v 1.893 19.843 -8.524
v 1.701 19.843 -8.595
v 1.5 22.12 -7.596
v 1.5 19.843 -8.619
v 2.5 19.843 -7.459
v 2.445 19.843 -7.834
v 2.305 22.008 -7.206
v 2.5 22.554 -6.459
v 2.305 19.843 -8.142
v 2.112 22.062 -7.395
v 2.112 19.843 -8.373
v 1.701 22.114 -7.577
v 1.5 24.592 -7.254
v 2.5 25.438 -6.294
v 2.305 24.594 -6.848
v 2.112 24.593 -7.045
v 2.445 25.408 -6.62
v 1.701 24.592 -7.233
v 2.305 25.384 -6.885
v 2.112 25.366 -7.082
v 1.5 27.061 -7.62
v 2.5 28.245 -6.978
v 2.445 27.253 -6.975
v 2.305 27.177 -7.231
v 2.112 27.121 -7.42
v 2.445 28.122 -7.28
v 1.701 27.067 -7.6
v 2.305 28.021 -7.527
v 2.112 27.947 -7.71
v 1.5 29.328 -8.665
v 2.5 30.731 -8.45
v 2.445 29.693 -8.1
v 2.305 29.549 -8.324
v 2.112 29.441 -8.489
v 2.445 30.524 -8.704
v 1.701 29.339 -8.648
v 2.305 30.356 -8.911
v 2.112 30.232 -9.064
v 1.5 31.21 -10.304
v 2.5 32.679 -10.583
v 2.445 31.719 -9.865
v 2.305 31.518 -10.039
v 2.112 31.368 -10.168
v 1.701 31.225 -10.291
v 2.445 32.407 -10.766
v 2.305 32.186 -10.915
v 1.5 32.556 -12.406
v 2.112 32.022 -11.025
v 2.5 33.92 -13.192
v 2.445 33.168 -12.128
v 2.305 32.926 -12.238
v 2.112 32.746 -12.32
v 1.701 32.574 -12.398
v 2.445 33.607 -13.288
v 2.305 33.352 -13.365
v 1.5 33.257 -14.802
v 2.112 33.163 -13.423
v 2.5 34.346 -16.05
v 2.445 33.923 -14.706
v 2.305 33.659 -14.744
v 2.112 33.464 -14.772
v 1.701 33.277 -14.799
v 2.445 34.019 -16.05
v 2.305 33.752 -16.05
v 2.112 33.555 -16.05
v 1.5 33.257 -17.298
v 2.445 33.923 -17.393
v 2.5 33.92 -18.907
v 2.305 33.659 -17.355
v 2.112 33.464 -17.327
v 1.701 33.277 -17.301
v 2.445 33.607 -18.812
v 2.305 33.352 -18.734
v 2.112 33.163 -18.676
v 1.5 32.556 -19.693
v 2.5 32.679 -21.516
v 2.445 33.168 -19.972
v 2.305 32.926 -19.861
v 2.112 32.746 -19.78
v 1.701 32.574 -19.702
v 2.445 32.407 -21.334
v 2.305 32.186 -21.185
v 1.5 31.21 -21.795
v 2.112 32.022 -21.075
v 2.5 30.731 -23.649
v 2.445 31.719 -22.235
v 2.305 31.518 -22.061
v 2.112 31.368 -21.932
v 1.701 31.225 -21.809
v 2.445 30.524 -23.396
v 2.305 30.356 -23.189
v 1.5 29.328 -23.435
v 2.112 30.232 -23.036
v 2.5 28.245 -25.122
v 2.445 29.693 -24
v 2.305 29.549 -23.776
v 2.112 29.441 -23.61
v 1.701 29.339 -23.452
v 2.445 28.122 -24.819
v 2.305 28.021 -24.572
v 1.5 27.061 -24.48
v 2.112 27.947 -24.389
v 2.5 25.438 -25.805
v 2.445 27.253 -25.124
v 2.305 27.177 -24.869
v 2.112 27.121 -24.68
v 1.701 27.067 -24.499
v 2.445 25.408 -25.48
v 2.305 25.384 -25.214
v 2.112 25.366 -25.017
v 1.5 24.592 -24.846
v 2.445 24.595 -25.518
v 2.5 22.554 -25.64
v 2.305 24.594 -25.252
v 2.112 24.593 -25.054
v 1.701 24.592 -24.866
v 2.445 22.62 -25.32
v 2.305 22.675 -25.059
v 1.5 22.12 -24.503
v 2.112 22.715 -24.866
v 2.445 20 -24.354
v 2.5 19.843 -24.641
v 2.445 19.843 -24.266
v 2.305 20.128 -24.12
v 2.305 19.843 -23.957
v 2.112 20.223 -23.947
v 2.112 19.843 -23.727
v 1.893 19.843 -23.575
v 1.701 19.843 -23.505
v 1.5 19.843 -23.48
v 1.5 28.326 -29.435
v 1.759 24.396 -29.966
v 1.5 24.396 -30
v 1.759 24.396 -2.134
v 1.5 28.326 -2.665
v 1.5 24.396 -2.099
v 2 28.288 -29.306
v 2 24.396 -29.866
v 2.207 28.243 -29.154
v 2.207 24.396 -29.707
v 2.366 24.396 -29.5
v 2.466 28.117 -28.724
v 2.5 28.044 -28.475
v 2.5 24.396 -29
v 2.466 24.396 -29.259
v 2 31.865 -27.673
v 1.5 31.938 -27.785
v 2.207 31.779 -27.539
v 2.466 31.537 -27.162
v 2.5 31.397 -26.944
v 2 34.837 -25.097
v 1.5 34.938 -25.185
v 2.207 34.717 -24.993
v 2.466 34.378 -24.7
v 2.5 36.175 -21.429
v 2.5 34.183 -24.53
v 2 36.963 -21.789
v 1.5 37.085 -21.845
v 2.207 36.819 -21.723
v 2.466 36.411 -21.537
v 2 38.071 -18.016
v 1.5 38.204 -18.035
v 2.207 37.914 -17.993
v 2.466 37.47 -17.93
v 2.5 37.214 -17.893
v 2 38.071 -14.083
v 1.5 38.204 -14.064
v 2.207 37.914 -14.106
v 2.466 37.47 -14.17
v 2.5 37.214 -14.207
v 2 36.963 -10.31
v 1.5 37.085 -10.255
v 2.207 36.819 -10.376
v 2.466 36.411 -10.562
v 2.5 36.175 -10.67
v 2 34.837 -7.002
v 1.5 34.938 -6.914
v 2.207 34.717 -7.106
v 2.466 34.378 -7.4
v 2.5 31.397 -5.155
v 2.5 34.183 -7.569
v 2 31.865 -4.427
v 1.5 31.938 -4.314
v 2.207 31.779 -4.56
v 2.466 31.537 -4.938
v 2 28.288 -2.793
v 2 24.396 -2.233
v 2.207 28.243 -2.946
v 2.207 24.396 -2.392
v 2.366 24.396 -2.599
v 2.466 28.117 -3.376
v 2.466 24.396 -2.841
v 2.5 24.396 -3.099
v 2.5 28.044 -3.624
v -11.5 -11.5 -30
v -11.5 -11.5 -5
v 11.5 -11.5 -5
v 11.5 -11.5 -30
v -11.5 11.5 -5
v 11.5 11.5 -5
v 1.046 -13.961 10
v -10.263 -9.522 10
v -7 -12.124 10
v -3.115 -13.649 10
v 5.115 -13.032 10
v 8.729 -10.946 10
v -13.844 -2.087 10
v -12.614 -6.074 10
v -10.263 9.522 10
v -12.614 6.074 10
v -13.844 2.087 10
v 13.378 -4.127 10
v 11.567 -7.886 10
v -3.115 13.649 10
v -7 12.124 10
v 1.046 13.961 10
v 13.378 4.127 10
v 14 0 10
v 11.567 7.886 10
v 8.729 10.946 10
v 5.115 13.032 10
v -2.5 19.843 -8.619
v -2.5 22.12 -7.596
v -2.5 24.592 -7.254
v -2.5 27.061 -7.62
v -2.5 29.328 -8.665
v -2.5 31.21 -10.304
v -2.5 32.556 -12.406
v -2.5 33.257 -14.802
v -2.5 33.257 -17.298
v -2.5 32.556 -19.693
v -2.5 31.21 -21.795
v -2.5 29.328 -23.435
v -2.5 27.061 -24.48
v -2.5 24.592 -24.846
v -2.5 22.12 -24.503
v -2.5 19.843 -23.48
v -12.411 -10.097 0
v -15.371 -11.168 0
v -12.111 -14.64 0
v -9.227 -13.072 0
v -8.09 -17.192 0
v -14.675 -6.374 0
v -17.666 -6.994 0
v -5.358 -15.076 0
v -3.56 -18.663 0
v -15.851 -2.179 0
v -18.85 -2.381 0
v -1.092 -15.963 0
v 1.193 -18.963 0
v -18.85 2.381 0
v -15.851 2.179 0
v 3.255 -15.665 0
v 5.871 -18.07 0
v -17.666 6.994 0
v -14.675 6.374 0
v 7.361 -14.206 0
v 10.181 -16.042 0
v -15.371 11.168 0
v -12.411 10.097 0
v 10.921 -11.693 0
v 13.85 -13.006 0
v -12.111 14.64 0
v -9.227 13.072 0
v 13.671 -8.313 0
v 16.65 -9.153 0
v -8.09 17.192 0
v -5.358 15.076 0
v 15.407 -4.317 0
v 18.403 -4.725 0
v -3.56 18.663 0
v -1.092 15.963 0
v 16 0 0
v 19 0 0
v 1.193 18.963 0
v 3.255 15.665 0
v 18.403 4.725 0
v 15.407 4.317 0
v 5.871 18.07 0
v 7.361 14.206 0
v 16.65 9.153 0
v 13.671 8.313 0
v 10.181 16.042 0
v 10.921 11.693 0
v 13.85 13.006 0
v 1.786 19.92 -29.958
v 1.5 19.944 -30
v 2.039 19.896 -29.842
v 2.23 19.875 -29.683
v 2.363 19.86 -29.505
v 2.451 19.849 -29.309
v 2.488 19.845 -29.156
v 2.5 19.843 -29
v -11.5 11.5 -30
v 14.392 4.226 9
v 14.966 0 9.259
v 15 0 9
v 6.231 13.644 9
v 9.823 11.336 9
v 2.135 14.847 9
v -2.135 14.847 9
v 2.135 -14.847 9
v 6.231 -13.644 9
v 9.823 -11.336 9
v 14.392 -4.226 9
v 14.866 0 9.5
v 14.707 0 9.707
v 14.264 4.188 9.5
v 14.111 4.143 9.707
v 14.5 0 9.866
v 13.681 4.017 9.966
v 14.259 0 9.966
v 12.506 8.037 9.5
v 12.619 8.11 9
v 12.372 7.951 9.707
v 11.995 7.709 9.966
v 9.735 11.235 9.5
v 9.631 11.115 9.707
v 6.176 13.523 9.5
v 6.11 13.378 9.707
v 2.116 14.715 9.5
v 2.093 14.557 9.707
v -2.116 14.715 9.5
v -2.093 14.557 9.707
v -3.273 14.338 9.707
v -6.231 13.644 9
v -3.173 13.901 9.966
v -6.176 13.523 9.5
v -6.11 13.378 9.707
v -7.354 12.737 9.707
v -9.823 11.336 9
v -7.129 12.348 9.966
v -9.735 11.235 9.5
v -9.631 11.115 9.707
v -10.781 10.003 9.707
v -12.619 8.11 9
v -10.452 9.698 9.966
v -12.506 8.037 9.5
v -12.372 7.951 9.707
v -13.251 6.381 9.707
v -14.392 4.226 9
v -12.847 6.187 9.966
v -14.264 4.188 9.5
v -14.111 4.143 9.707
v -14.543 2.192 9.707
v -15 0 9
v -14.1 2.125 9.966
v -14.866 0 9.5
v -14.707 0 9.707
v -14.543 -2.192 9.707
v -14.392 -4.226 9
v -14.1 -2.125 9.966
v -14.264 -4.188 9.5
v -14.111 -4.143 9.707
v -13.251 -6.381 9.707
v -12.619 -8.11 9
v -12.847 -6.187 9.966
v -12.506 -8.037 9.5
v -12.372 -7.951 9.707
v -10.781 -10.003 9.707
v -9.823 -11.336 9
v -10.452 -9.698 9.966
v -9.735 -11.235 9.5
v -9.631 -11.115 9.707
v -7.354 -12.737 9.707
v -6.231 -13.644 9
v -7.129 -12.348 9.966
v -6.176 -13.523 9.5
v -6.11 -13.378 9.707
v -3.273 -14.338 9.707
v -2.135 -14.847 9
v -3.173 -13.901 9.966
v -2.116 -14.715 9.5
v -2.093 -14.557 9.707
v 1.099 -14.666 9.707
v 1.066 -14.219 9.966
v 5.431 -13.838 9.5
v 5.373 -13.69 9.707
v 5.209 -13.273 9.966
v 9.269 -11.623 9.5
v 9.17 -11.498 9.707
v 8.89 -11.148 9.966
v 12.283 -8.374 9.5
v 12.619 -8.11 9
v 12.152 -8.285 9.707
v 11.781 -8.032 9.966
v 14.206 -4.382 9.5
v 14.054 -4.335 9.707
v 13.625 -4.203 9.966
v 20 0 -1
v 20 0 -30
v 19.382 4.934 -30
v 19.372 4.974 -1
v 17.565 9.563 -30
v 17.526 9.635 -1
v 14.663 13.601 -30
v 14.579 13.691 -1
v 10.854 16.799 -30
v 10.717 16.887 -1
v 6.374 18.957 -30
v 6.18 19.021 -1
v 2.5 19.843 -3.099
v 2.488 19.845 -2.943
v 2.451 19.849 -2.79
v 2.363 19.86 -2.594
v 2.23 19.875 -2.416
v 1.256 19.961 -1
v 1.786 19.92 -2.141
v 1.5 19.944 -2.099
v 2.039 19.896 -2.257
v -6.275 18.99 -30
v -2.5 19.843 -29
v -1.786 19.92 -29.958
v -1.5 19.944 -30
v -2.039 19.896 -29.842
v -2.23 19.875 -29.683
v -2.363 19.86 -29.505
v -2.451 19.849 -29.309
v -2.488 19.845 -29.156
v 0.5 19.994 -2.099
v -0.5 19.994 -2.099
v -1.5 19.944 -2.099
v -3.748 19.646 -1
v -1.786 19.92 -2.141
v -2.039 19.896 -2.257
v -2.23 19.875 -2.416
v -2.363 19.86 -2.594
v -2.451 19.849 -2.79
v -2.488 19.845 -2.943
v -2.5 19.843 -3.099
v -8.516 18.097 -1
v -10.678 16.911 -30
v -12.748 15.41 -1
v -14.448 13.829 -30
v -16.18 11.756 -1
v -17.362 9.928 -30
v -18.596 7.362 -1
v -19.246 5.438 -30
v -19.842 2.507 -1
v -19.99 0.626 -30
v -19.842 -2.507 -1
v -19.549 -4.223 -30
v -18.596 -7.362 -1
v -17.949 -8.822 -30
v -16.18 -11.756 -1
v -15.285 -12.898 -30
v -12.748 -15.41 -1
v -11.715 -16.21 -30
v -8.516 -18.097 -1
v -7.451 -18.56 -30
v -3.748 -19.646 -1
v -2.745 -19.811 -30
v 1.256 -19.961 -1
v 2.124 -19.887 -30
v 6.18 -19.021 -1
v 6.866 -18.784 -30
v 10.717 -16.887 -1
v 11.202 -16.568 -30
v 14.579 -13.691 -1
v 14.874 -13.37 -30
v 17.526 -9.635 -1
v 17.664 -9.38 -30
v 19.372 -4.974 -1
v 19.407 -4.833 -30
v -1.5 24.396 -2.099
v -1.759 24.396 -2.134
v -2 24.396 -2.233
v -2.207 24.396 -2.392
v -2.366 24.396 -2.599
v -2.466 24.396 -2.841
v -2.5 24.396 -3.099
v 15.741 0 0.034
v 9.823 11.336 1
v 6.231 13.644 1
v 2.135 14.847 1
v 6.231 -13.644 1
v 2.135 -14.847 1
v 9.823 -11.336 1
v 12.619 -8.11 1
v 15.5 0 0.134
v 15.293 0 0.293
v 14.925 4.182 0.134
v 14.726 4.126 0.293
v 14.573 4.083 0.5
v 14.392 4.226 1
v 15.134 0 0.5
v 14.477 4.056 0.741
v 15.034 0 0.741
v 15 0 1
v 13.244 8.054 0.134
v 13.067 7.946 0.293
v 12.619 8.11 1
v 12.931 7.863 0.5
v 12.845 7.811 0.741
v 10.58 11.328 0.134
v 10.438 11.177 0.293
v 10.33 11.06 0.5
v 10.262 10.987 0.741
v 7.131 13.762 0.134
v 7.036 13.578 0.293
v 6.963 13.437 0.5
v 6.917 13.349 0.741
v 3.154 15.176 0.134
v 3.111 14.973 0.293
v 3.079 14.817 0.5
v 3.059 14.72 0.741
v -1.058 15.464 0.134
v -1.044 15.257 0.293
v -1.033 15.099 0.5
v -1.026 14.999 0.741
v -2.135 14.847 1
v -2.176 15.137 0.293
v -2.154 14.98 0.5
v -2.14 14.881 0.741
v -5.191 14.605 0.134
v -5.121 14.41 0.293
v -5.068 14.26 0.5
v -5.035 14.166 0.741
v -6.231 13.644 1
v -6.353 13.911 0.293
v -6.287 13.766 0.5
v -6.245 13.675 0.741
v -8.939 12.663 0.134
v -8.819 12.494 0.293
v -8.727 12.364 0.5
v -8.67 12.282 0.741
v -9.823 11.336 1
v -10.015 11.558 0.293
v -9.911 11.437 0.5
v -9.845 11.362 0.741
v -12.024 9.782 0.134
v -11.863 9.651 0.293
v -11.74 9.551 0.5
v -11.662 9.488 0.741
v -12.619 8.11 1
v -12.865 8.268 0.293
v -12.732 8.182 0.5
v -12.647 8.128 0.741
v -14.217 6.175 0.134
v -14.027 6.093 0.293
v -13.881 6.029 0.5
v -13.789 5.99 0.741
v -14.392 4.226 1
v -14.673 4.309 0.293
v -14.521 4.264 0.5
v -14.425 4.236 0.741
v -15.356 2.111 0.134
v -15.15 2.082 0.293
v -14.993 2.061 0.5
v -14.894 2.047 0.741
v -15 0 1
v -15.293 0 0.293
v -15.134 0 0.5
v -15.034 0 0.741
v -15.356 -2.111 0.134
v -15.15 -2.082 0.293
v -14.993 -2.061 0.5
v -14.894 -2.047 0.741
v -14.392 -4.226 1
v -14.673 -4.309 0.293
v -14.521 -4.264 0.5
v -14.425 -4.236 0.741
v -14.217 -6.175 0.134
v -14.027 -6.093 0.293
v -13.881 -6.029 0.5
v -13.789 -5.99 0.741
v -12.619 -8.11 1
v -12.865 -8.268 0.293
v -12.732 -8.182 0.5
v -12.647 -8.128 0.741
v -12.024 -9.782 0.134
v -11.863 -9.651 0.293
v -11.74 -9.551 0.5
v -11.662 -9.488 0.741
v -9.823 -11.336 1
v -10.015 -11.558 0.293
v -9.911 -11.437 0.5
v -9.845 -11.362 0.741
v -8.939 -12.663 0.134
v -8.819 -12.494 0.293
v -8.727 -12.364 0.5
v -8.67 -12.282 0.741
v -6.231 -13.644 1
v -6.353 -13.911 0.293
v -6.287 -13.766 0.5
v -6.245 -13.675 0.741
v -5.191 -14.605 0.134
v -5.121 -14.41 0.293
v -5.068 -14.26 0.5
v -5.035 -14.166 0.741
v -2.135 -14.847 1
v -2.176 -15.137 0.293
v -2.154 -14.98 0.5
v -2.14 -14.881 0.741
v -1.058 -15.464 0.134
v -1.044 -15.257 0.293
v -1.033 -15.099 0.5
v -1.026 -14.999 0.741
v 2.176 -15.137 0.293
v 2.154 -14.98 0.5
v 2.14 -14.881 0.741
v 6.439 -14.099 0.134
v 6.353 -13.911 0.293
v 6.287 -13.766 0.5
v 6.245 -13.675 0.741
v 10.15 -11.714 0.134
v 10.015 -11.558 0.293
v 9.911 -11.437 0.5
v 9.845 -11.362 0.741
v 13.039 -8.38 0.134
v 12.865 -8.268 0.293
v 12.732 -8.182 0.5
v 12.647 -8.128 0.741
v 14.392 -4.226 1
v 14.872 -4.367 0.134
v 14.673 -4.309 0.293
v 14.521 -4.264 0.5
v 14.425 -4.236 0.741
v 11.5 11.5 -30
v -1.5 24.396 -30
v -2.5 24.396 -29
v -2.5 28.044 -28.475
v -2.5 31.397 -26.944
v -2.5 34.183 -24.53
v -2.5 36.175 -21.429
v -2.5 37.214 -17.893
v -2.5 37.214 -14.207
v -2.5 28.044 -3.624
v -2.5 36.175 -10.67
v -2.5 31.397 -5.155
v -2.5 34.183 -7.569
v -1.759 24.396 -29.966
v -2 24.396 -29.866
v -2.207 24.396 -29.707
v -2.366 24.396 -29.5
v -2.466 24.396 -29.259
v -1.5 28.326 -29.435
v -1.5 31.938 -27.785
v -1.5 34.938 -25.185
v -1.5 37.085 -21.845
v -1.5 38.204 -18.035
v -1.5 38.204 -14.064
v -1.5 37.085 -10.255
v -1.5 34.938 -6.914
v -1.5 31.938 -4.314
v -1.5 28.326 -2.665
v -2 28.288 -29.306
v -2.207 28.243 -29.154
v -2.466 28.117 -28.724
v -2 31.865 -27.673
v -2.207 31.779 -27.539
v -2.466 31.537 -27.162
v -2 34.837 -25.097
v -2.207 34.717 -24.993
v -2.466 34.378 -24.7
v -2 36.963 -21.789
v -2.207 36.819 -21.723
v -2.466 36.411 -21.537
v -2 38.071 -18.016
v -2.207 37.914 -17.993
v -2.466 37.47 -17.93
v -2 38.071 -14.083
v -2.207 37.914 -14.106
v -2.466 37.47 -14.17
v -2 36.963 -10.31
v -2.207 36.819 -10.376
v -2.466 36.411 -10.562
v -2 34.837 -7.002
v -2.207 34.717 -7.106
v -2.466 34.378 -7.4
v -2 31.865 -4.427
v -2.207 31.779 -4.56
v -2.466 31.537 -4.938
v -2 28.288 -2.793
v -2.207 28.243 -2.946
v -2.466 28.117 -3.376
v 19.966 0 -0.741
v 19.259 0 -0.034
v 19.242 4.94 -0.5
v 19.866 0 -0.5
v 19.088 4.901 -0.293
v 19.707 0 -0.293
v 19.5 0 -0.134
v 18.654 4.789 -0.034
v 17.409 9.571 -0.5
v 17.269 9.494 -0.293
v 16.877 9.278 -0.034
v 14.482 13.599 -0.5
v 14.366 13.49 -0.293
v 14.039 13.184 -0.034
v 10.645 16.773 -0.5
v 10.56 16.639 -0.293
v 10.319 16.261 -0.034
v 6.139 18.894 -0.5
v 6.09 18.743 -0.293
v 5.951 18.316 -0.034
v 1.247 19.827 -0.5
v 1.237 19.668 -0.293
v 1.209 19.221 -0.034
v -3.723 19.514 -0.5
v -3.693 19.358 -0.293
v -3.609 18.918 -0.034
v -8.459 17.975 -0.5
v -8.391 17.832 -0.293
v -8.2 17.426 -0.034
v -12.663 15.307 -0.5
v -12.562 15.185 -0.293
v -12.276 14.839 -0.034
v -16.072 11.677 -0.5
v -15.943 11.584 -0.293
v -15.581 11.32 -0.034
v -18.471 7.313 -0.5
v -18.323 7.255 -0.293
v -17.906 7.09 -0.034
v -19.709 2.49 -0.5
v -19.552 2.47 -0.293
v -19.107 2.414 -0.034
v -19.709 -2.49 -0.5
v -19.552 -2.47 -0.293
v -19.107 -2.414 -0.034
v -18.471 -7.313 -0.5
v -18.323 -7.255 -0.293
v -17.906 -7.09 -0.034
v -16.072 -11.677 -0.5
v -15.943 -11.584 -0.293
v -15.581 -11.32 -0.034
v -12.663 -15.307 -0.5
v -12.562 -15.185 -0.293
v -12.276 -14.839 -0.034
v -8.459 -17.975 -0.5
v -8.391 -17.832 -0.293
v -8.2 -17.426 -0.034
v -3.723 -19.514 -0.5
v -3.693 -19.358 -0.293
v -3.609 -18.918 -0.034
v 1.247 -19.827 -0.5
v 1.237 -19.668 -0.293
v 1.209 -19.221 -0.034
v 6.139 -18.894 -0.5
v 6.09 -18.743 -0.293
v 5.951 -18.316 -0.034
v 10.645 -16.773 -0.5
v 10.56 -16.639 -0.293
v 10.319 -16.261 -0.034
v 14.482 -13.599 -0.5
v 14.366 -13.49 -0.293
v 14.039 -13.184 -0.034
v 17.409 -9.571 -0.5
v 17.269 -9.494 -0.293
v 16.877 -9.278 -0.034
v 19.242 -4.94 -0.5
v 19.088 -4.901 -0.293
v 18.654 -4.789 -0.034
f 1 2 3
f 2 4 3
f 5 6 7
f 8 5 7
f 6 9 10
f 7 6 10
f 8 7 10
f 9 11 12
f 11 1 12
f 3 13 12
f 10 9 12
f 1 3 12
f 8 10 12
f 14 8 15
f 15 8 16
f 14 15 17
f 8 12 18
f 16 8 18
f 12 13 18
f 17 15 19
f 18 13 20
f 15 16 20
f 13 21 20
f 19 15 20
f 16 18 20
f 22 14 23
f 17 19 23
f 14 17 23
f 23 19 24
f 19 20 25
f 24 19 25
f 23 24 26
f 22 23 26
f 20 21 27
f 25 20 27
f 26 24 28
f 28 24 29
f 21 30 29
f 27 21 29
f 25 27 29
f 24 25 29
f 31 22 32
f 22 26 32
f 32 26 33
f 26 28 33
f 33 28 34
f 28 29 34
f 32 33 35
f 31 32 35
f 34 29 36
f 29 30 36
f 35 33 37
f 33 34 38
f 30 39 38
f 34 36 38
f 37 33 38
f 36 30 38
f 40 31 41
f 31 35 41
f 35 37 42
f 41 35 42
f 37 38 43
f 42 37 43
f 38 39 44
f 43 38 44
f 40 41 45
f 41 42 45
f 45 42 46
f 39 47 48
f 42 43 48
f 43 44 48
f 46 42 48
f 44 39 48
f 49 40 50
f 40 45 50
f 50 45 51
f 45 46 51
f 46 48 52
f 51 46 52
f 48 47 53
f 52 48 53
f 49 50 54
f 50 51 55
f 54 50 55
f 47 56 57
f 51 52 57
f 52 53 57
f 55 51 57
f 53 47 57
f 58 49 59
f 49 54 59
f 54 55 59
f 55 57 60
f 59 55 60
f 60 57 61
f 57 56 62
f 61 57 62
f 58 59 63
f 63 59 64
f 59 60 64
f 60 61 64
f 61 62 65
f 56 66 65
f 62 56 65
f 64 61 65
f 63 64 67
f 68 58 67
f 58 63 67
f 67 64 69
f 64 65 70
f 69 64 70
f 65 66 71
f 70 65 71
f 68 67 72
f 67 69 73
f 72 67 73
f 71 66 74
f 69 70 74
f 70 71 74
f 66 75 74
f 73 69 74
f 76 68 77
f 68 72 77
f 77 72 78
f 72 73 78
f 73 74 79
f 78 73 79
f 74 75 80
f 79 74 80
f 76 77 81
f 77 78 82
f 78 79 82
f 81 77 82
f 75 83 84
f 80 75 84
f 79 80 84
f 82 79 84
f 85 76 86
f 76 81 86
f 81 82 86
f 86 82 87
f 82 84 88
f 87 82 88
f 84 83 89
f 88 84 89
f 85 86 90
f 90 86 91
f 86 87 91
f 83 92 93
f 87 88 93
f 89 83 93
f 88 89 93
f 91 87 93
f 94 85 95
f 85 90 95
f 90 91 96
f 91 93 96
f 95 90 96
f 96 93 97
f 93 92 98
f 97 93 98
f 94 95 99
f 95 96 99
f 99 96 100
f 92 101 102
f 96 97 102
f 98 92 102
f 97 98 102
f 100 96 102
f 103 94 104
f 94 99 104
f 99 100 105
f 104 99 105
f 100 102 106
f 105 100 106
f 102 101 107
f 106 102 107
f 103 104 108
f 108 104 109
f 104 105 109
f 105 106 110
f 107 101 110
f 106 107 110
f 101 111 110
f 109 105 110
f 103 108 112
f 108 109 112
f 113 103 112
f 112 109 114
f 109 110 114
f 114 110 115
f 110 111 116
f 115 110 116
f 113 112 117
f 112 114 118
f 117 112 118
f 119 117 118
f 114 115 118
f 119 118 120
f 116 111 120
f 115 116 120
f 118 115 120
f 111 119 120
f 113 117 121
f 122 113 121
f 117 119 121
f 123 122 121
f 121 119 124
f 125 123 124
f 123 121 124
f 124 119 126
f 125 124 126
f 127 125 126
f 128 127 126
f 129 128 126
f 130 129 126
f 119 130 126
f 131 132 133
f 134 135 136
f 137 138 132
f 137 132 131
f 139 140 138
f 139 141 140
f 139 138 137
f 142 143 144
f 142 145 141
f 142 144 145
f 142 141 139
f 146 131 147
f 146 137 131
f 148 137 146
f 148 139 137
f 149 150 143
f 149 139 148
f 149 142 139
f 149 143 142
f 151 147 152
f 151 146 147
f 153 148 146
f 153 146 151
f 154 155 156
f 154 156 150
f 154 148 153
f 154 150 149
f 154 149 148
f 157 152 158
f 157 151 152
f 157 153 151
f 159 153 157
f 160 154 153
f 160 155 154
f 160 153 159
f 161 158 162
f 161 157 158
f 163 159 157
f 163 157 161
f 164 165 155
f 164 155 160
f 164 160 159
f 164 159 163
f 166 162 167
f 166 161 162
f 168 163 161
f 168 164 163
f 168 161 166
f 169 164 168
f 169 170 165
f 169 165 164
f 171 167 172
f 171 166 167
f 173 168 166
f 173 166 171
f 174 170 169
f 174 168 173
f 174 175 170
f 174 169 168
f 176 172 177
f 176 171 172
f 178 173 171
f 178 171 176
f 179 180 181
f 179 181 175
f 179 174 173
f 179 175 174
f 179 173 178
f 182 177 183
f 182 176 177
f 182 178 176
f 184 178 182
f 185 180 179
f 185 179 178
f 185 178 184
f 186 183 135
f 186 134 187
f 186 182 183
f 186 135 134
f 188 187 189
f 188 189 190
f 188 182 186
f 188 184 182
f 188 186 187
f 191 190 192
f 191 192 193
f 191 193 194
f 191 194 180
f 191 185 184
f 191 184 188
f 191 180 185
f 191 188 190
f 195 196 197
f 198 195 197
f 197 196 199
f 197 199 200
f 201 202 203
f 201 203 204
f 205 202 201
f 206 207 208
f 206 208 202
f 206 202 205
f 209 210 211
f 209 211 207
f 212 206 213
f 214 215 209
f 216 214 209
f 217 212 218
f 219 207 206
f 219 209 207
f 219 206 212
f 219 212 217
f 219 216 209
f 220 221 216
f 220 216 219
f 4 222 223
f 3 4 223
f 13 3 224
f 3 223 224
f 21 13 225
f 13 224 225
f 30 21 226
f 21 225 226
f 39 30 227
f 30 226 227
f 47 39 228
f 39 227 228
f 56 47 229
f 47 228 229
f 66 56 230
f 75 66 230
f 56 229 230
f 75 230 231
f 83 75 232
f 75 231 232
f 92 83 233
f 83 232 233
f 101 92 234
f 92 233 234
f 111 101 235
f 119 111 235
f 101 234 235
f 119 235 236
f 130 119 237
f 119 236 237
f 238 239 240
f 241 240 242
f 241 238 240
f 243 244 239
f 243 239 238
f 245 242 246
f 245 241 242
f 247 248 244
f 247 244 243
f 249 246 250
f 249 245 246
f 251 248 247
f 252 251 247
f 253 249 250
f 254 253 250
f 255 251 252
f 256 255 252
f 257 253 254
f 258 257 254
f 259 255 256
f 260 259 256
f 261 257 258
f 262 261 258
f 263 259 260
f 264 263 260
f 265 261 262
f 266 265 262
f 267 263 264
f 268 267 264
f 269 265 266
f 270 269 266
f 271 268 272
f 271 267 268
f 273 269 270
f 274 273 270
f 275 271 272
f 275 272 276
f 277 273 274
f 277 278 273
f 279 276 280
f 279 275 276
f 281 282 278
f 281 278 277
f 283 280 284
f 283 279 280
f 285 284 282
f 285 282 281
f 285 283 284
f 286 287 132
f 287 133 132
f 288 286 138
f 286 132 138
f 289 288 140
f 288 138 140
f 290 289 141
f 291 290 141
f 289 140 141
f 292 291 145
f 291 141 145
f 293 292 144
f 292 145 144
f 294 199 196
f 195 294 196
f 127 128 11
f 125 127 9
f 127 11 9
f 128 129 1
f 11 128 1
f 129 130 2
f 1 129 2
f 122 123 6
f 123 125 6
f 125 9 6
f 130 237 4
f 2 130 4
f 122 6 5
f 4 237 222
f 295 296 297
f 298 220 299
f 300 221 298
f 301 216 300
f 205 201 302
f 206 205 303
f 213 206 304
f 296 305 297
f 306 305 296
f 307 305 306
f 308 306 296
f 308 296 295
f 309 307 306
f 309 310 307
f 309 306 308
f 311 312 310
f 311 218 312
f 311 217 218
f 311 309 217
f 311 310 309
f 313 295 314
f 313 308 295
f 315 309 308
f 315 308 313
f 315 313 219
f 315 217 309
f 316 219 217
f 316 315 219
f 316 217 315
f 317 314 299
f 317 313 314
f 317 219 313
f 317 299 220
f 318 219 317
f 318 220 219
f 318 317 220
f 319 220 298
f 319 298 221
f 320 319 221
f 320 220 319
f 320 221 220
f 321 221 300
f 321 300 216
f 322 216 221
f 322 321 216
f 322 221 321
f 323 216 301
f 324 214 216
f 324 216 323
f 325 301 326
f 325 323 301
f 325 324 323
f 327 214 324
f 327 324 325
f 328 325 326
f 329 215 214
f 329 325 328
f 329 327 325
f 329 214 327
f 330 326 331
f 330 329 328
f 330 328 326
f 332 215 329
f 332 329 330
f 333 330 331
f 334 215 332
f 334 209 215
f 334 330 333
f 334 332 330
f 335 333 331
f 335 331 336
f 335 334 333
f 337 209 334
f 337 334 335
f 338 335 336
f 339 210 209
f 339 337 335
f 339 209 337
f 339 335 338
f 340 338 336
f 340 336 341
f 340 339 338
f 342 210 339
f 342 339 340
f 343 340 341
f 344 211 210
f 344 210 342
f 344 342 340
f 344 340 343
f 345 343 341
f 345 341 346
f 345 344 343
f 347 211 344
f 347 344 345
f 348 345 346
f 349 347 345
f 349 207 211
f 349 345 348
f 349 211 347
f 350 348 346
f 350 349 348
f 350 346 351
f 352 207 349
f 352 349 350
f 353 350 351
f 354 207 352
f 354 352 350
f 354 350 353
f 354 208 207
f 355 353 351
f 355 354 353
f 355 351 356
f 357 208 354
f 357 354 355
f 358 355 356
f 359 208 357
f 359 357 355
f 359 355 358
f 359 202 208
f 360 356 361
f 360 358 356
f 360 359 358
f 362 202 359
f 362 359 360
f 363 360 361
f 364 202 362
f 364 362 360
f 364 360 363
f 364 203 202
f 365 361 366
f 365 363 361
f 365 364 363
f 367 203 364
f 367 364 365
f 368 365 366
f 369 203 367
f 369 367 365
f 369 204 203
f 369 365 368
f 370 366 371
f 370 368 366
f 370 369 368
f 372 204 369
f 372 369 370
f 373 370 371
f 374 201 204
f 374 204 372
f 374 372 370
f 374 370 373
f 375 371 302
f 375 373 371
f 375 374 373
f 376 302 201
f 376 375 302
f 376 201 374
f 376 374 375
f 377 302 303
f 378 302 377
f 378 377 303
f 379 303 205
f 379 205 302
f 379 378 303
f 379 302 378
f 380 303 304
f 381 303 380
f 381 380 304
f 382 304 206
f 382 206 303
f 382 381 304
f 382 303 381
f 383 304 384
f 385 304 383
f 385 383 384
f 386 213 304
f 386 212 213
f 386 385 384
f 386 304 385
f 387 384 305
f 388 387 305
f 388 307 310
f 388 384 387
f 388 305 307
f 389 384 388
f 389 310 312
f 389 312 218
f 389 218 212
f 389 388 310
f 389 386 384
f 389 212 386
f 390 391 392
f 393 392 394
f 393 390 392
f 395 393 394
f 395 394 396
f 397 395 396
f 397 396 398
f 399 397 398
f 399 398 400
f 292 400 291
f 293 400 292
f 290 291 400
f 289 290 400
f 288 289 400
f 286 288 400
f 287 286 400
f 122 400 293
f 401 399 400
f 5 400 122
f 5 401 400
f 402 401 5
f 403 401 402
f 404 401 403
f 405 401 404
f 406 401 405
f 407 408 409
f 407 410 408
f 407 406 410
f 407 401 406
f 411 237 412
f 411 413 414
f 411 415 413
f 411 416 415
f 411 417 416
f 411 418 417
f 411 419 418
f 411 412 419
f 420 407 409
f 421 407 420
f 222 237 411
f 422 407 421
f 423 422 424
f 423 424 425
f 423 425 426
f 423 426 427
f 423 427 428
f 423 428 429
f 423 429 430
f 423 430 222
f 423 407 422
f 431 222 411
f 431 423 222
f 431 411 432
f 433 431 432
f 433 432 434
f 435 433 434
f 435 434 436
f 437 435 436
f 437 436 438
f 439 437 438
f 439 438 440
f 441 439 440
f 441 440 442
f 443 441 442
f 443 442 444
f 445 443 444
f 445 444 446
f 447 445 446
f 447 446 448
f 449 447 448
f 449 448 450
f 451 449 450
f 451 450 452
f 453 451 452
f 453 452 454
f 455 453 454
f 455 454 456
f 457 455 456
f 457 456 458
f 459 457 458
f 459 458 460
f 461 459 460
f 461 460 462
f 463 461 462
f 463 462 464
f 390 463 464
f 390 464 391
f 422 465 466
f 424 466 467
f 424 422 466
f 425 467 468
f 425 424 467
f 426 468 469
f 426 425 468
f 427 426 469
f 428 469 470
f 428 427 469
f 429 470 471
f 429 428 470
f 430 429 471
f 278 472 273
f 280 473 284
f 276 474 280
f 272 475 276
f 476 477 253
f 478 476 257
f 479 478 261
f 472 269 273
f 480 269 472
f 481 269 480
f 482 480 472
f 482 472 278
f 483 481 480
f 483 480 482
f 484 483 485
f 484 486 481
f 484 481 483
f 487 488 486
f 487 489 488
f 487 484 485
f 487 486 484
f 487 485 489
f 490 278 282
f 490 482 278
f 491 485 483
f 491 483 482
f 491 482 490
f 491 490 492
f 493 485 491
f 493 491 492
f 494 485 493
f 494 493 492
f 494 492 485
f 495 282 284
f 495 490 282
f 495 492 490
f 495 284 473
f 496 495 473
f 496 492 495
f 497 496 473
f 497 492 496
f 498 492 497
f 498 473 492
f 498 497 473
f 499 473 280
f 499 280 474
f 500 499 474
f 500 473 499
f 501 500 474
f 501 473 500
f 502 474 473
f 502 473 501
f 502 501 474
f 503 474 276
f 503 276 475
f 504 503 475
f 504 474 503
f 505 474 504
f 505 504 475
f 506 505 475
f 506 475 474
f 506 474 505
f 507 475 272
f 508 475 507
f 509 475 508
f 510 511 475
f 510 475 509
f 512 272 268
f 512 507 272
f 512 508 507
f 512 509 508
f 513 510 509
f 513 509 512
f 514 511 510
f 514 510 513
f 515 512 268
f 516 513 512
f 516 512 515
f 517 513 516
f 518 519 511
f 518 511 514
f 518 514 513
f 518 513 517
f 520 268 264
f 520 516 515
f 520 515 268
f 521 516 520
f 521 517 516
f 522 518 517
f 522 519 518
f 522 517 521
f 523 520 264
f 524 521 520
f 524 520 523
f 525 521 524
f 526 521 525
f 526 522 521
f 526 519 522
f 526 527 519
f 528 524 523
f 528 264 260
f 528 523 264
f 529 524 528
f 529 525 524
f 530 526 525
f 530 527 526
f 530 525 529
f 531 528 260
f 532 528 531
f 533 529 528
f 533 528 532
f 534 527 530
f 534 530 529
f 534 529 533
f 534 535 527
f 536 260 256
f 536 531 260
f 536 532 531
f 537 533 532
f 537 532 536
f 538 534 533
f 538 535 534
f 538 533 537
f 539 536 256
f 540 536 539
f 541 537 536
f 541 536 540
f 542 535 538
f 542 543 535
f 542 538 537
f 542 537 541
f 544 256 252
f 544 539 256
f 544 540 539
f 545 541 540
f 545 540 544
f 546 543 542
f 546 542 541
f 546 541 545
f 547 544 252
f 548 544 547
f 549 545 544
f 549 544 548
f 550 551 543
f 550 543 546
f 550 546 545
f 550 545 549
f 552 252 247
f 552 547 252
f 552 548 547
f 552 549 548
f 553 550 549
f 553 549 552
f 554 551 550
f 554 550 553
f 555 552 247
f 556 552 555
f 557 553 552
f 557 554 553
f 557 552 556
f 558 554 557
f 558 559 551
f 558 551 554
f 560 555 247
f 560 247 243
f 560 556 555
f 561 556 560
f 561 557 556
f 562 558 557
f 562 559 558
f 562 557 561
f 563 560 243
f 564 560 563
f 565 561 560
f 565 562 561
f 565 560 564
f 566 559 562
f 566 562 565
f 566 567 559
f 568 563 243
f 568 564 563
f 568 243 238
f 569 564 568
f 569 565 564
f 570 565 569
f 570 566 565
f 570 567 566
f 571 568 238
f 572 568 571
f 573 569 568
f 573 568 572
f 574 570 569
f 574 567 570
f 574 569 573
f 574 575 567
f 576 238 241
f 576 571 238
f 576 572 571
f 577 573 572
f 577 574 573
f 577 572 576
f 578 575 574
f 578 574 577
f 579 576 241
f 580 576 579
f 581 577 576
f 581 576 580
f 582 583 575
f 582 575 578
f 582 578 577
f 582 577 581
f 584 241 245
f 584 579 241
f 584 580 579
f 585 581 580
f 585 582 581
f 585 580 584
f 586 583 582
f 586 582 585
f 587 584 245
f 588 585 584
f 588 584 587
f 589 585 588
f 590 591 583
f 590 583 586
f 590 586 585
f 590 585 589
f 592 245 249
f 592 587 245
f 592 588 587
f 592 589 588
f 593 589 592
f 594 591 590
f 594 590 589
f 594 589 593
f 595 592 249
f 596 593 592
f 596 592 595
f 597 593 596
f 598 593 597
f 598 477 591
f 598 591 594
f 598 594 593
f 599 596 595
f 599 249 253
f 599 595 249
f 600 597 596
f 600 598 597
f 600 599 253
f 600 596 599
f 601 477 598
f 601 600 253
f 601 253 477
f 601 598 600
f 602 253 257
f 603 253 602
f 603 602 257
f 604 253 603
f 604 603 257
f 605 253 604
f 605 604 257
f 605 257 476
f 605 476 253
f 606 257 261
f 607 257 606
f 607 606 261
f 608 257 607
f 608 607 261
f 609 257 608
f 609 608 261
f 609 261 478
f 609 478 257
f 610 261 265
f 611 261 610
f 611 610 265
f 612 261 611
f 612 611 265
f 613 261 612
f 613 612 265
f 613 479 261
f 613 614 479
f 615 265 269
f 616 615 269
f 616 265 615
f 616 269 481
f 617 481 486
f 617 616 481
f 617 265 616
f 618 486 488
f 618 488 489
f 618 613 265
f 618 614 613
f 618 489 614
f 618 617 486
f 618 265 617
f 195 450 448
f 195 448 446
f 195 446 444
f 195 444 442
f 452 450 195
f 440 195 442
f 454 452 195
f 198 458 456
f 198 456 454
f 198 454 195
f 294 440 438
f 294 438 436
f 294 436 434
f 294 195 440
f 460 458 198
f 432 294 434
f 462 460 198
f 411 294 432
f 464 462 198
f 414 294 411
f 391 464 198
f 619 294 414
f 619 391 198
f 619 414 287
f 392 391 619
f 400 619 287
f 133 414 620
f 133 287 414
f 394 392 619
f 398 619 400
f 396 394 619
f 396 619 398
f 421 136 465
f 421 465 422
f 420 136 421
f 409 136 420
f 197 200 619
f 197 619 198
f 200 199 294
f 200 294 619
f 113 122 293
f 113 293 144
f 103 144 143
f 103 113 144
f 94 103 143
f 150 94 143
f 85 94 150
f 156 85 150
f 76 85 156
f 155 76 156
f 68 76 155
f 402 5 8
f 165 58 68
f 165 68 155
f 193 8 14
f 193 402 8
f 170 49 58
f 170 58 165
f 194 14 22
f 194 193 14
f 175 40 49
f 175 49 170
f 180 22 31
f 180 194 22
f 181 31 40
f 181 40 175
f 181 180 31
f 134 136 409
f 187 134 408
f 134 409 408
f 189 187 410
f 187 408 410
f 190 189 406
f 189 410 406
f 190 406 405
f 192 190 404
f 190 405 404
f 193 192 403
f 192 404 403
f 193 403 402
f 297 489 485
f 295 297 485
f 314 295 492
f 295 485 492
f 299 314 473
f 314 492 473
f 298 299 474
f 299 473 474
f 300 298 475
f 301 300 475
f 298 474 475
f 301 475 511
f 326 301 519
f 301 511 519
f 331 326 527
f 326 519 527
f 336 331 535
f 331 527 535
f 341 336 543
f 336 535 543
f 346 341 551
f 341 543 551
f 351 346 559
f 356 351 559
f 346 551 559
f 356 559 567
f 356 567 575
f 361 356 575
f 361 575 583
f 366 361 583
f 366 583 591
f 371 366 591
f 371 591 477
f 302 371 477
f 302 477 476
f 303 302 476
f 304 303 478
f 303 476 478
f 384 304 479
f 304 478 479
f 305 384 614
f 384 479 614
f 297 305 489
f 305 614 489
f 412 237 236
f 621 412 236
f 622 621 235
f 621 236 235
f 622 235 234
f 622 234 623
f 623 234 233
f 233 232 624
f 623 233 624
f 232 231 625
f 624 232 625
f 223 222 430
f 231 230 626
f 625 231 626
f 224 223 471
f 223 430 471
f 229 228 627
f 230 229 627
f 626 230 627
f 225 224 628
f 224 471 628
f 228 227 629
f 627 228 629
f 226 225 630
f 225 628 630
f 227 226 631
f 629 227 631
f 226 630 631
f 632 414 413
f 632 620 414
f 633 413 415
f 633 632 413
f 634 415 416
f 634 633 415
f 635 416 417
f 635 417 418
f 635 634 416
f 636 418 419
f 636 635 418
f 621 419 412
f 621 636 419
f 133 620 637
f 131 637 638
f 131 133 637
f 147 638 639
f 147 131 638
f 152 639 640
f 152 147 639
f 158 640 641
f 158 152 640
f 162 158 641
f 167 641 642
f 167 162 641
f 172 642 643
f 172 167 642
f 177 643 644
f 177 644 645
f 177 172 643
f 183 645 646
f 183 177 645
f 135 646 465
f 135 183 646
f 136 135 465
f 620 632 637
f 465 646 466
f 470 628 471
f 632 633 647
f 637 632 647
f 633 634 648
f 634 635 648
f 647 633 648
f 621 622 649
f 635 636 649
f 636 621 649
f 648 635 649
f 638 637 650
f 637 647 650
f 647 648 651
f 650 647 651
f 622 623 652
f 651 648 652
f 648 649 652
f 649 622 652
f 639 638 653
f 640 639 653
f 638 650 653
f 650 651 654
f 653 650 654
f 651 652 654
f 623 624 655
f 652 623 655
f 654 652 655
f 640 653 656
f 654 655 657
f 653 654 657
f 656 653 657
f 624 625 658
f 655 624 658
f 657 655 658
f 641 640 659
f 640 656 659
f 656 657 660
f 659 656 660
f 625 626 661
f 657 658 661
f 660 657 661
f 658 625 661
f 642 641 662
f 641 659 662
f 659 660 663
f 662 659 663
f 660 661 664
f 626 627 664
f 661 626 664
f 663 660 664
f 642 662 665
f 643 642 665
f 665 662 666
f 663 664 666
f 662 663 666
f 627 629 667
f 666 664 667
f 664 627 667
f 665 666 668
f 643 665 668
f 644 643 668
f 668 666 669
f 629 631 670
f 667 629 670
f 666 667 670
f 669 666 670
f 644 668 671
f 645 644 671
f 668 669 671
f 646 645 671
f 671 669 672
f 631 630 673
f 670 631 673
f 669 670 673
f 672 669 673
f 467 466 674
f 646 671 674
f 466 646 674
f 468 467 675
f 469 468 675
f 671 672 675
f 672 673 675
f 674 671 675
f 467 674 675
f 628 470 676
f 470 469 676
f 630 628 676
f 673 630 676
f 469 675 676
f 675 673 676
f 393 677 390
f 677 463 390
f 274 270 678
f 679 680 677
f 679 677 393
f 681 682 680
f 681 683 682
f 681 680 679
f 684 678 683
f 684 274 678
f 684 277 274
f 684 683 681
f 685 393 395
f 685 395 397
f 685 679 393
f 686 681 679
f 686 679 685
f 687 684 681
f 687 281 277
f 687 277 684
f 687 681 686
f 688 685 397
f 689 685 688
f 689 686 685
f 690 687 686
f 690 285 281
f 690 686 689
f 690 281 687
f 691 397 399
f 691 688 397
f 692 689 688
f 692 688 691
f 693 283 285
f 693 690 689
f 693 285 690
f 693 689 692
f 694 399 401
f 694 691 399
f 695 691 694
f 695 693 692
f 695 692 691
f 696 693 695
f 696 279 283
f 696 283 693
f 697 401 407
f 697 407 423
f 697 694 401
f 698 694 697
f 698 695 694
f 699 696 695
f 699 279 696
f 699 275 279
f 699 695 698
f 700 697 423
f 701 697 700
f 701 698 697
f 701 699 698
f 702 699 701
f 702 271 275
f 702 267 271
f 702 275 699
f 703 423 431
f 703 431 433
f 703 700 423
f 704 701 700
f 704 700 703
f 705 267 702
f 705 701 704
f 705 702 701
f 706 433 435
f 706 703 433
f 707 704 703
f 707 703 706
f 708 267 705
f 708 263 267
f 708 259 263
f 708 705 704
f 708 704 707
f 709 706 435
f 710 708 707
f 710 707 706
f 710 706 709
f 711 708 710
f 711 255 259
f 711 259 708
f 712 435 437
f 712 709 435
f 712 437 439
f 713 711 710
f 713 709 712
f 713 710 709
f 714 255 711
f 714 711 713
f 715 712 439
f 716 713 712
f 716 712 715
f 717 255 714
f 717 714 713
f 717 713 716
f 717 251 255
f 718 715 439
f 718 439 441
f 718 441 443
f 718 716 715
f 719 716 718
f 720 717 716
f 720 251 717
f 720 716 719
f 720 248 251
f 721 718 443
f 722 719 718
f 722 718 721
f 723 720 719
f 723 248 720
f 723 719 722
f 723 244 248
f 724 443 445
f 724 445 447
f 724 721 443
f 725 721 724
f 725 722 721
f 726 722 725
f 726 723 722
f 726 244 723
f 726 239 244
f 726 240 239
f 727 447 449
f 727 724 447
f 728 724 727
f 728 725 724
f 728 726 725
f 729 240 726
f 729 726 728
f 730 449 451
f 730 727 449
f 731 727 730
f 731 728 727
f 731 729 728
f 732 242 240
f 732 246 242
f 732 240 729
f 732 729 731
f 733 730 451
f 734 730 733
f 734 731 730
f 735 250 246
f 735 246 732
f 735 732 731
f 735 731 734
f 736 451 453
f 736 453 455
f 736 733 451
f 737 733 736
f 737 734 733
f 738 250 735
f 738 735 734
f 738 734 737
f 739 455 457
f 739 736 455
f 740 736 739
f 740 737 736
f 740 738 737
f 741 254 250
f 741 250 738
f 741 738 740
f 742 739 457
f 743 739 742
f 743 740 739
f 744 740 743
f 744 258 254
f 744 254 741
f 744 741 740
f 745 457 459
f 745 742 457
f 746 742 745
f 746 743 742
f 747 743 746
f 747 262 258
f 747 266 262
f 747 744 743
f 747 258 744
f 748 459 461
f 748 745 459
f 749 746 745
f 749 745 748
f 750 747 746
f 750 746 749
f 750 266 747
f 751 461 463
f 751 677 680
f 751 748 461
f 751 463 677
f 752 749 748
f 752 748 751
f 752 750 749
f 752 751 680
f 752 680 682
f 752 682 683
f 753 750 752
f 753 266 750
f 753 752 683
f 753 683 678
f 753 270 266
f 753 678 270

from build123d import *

# Parameters (mm, degrees)
F0_R          = 15
F1_DEPTH      = 10
F2_R          = 20
F3_DEPTH      = 30
F5_DEPTH      = 2.5
F5_DEPTH_BACK = 2.5
F7_DEPTH      = 25
F8_W          = 23
F8_H          = 23
F9_DEPTH      = 25
F10_R         = 1


with BuildPart() as f1:
    # F0 (on Top) → F1 (new body)
    with BuildSketch(Plane.XY):
        Circle(F0_R)
    extrude(amount=F1_DEPTH)

    # F2 (on Top) → F3 (join)
    with BuildSketch(Plane.XY):
        Circle(F2_R)
    extrude(amount=-F3_DEPTH)

    # F4 (on Right) → F5 (join, two sides)
    with BuildSketch(Plane.YZ) as f5_sk:
        with BuildLine():
            ThreePointArc((24.3955058538, -30), (34.2598373067, -25.9140601285), (38.3457771782, -16.0497286756))
            ThreePointArc((38.3457771782, -16.0497286756), (34.2598373067, -6.1853972226), (24.3955058538, -2.0994573511))
            Line((24.3955058538, -2.0994573511), (17.0112717897, -7.5845918618))
            Line((17.0112717897, -7.5845918618), (15.4388935224, -5.3544416027))
            ThreePointArc((15.4388935224, -5.3544416027), (10.5016803992, -17.3033969985), (17.4980895184, -28.1755572213))
            Line((17.4980895184, -28.1755572213), (18.3211155236, -26.8716588616))
            Line((18.3211155236, -26.8716588616), (24.3955058538, -30))
        make_face()
        with BuildLine():
            Line((17.0112717897, -7.5845918618), (24.3955058538, -2.0994573511))
            ThreePointArc((24.3955058538, -2.0994573511), (19.6306389371, -2.9384315127), (15.4388935224, -5.3544416027))
            Line((15.4388935224, -5.3544416027), (17.0112717897, -7.5845918618))
        make_face()
        with BuildLine():
            ThreePointArc((15.4388935224, -5.3544416027), (19.6306389371, -2.9384315127), (24.3955058538, -2.0994573511))
            Line((24.3955058538, -2.0994573511), (13.1439510733, -2.0994573511))
            Line((13.1439510733, -2.0994573511), (15.4388935224, -5.3544416027))
        make_face()
        with BuildLine():
            Line((16.3464937359, -30), (24.3955058538, -30))
            ThreePointArc((24.3955058538, -30), (20.8281909127, -29.5361786954), (17.4980895184, -28.1755572213))
            Line((17.4980895184, -28.1755572213), (16.3464937359, -30))
        make_face()
        with BuildLine():
            ThreePointArc((17.4980895184, -28.1755572213), (20.8281909127, -29.5361786954), (24.3955058538, -30))
            Line((24.3955058538, -30), (18.3211155236, -26.8716588616))
            Line((18.3211155236, -26.8716588616), (17.4980895184, -28.1755572213))
        make_face()
    extrude(amount=F5_DEPTH)
    extrude(f5_sk.sketch, amount=-F5_DEPTH_BACK)

    # F6 (on face) → F7 (cut)
    with BuildSketch(Plane(origin=(-2.5, 0, 0), x_dir=(0, -1, 0), z_dir=(-1, 0, 0))):
        with BuildLine():
            Line((-19.843134833, -23.4803773318), (-19.843134833, -8.6190800193))
            ThreePointArc((-19.843134833, -8.6190800193), (-33.3457771782, -16.0497286756), (-19.843134833, -23.4803773318))
        make_face()
    extrude(amount=-F7_DEPTH, mode=Mode.SUBTRACT)

    # F8 (on face) → F9 (cut)
    with BuildSketch(Plane(origin=(0, 0, -30), x_dir=(1, 0, 0), z_dir=(0, 0, -1))):
        Rectangle(F8_W, F8_H)
    extrude(amount=-F9_DEPTH, mode=Mode.SUBTRACT)

    # F10
    f10_edges = [f1.edges().sort_by_distance(p)[0] for p in [
        (-15, 0, 10),
        (-20, 0, 0),
        (2.5, 22.11932, -2.099457),
        (-2.5, 38.345777, -16.049729),
        (2.5, 33.345777, -16.049729),
        (-15, 0, 0),
    ]]
    fillet(f10_edges, radius=F10_R)


solid = f1.part
